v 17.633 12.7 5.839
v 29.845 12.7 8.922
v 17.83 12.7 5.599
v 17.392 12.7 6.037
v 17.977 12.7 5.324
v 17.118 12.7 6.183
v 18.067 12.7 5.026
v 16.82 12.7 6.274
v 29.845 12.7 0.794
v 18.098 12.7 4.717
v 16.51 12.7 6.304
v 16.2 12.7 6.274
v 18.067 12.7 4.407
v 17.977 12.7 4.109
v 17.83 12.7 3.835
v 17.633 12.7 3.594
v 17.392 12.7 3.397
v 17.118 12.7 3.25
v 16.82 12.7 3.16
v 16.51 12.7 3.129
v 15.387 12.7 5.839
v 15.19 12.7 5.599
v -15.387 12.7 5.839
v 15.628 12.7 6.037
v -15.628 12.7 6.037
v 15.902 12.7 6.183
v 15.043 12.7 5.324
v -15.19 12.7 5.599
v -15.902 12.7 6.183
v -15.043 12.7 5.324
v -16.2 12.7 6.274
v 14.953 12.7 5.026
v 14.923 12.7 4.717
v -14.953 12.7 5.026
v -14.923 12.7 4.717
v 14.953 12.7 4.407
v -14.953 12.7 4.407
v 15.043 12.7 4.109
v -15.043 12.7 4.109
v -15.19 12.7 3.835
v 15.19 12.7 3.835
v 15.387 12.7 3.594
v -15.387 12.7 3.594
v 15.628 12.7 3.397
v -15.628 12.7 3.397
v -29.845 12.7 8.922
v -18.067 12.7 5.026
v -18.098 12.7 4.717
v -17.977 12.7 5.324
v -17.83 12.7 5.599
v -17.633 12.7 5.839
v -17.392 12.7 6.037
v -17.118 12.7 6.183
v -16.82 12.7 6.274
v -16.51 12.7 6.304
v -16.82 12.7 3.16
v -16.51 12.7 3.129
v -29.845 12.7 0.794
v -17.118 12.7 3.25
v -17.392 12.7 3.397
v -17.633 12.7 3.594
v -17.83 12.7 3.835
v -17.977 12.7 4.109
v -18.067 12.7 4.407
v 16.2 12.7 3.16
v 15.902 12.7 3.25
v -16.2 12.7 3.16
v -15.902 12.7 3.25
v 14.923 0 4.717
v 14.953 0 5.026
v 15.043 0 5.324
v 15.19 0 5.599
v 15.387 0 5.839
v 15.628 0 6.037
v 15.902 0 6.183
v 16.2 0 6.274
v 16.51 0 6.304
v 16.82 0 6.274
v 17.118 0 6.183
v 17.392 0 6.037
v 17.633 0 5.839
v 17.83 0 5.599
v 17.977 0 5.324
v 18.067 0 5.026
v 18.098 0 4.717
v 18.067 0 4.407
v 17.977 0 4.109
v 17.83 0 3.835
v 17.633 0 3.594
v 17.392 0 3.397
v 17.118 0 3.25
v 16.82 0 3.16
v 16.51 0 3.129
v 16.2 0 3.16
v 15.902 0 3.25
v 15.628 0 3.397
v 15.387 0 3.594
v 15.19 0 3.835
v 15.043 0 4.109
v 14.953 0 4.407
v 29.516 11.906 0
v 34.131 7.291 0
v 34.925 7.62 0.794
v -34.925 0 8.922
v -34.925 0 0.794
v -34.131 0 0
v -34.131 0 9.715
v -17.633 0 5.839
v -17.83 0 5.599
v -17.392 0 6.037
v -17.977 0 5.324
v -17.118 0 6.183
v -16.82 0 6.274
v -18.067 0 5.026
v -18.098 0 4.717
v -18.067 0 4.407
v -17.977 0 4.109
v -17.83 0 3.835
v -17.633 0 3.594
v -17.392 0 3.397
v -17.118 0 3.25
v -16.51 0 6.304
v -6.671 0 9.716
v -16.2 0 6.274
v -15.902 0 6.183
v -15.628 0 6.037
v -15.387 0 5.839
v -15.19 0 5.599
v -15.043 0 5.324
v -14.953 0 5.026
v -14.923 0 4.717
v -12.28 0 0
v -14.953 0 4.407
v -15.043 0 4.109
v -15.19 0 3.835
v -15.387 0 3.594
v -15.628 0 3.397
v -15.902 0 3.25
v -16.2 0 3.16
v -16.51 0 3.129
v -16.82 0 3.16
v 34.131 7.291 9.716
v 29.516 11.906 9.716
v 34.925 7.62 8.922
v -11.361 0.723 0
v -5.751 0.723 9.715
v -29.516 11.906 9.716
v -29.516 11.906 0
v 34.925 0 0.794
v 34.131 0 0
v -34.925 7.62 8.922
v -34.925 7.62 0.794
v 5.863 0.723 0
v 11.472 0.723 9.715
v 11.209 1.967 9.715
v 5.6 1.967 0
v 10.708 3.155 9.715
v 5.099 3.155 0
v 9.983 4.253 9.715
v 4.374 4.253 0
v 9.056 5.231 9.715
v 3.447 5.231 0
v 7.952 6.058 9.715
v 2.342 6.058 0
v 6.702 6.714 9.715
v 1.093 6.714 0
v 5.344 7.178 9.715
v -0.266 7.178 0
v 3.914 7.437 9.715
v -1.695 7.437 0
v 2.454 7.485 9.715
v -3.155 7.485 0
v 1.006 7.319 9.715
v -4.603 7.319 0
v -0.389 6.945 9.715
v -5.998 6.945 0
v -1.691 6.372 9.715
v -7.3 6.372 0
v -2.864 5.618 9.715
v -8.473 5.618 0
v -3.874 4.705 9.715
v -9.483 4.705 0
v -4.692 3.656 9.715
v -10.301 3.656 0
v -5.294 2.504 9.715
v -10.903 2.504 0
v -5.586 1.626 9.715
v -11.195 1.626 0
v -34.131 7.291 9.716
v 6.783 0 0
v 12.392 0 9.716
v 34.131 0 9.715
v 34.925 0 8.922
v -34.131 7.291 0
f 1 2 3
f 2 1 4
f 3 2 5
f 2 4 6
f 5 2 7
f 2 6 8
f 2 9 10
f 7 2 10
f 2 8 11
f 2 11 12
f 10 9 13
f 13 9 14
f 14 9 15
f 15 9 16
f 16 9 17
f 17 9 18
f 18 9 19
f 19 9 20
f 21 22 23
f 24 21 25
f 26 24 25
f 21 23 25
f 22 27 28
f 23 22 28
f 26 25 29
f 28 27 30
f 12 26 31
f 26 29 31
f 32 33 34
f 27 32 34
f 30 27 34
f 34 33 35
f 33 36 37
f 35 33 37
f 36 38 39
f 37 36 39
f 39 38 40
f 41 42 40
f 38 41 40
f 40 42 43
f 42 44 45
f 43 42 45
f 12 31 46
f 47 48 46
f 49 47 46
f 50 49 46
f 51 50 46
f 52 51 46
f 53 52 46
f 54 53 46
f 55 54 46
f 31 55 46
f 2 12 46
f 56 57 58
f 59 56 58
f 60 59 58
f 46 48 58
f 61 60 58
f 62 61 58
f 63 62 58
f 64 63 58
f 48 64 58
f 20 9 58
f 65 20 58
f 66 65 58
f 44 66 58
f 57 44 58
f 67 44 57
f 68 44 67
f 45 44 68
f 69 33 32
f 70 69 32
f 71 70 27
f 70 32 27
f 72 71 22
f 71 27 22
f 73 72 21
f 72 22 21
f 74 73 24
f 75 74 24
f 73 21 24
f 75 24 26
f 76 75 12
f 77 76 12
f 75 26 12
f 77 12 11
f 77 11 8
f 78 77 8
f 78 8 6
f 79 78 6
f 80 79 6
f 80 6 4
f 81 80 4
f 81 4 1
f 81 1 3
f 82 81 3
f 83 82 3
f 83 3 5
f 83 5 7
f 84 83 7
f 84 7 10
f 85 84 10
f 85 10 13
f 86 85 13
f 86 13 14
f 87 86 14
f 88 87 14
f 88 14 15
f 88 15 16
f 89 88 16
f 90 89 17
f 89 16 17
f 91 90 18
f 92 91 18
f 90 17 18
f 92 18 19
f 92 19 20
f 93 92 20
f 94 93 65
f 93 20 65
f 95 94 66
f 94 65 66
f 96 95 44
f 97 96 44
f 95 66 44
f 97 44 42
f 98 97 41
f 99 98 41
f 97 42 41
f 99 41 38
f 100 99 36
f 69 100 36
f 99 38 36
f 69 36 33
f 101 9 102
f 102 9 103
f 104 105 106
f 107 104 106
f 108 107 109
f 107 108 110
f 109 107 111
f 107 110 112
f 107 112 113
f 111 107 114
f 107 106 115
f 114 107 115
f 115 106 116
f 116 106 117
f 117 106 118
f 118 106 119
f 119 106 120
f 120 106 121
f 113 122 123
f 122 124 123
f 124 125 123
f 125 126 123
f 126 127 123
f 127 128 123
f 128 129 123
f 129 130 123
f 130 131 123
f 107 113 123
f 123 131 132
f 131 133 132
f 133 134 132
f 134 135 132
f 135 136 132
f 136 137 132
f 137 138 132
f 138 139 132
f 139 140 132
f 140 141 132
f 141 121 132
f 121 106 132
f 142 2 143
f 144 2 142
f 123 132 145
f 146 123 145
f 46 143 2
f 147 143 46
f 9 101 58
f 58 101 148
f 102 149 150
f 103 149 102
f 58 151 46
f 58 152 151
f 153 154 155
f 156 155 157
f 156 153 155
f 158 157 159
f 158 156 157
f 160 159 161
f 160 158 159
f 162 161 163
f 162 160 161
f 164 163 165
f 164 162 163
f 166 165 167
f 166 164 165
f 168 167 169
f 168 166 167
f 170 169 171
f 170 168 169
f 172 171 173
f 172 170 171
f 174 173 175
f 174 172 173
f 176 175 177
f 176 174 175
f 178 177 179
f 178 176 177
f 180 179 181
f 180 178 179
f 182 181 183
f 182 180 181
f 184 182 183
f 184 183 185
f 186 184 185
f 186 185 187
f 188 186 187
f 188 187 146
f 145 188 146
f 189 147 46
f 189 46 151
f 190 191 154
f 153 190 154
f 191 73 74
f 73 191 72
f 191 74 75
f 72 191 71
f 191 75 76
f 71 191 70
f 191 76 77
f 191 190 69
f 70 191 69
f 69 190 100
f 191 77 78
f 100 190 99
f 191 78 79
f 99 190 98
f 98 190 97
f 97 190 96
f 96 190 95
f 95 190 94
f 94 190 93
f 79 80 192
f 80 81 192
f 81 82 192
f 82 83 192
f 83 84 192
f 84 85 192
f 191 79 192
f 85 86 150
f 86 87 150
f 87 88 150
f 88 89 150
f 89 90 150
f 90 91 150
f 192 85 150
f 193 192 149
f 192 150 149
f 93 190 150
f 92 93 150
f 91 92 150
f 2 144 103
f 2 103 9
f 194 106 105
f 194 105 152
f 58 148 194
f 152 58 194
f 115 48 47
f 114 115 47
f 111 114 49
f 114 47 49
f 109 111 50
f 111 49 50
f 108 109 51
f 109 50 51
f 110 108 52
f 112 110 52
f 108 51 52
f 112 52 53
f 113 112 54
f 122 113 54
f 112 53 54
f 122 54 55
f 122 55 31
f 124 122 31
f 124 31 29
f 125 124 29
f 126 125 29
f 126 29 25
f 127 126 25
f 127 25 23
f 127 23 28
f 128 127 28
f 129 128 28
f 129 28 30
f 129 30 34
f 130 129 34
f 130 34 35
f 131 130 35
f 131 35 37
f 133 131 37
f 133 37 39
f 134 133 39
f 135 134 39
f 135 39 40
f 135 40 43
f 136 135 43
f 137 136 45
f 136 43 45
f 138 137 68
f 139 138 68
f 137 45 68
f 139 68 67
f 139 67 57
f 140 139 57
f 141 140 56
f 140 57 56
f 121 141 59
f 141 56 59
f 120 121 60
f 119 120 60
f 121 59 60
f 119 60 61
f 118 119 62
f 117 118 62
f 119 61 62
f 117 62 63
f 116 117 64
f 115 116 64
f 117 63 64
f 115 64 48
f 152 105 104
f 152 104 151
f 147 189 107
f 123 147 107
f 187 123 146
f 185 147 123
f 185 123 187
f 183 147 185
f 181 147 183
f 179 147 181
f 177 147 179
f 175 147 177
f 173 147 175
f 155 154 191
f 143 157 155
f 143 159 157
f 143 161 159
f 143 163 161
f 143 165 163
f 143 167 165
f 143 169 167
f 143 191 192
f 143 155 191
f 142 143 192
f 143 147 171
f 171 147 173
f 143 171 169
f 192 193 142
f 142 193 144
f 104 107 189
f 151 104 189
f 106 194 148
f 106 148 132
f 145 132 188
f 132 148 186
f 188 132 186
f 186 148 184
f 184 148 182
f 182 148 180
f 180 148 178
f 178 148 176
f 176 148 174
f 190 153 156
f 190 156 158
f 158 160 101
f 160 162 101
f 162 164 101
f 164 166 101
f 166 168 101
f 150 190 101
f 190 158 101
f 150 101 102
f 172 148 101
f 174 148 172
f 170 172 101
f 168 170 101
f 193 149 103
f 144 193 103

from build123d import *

# Parameters (mm, degrees)
F0_W         = 34.925
F0_H         = 12.7
F1_DEPTH     = 9.7155
F3_R         = 1.5875
F4_DEPTH     = 25.4
F5_SIZE      = 0.79375
F6_T1_DEPTH  = 34.2562991577
F7_SIZE      = 0.79375
F11_R        = 7.493
F12_DEPTH    = 50.8
F13_T1_DEPTH = 15.1455192093
F13_T3_DEPTH = 15.1455192093


# Not quite as in the source:
# - a fillet or chamfer that OpenCascade refuses, or shapes differently, is made with other operations: its cross-section is extruded or revolved along the edge and cut away or added


with BuildPart() as f1:
    # F0 (on Top) → F1 (new body)
    with BuildSketch(Plane.XY):
        with Locations((-17.4625, 6.35)):
            Rectangle(F0_W, F0_H)
        with Locations((17.4625, 6.35)):
            Rectangle(F0_W, F0_H)
    extrude(amount=F1_DEPTH)

    # F3 (on face) → F4 (cut)
    with BuildSketch(Plane(origin=(0, 12.7, 0), x_dir=(-1, 0, 0), z_dir=(0, 1, 0))):
        with Locations((16.51, 4.71678)):
            Circle(F3_R)
        with Locations((-16.51, 4.71678)):
            Circle(F3_R)
    extrude(amount=-F4_DEPTH, mode=Mode.SUBTRACT)

    # F5
    f5_edges = [f1.edges().sort_by_distance(p)[0] for p in [
        (-34.925, 6.35, 9.7155),
        (34.925, 6.35, 9.7155),
        (0, 12.7, 9.7155),
        (0, 12.7, 0),
        (-34.925, 6.35, 0),
        (34.925, 6.35, 0),
    ]]
    chamfer(f5_edges, length=F5_SIZE)

    # F6: chamfer of 5.08 on 2 edges, made by hand

    # F6_s2 → F6_t1 (cut)
    with BuildSketch(Plane.XY.offset(-12.2703995789)):
        Polygon((34.925, 7.62), (29.845, 12.7), (34.925, 12.7), align=None)
        Polygon((-34.925, 7.62), (-29.845, 12.7), (-34.925, 12.7), align=None)
    extrude(amount=F6_T1_DEPTH, mode=Mode.SUBTRACT)

    # F7
    f7_edges = [f1.edges().sort_by_distance(p)[0] for p in [
        (32.385, 10.16, 0),
        (32.385, 10.16, 9.7155),
        (-32.385, 10.16, 9.7155),
        (-32.385, 10.16, 0),
    ]]
    chamfer(f7_edges, length=F7_SIZE)

    # F11 (on face) → F12 (cut)
    with BuildSketch(Plane(origin=(-8.3875461679, 0, -14.5276561136), x_dir=(0.8660254038, 0, -0.5), z_dir=(0.5, 0, 0.8660254038))):
        with Locations((-2.3805295629, 0)):
            Circle(F11_R)
    extrude(amount=F12_DEPTH, mode=Mode.SUBTRACT)

    # F13: chamfer of 0.8001 on 2 edges, made by hand

    # F13_s2 → F13_t1 (cut)
    with BuildSketch(Plane(origin=(3.740760597, 0, 6.4791874129), x_dir=(0, 1, 0), z_dir=(-0.5, 0, -0.8660254038))):
        with BuildLine():
            Line((0, -10.6349433883), (0.7229081164, -9.8385757451))
            ThreePointArc((0.7229081164, -9.8385757451), (0.3732081581, -9.8642294948), (0, -9.8735295629))
            Line((0, -9.8735295629), (0, -10.6349433883))
        make_face()
    extrude(amount=F13_T1_DEPTH, mode=Mode.SUBTRACT)

    # F13_s4 → F13_t3 (cut)
    with BuildSketch(Plane(origin=(0.4940865594, 0, 0.8557830242), x_dir=(0, 1, 0), z_dir=(0.5, 0, 0.8660254038))):
        with BuildLine():
            Line((0, -5.8738842624), (0.7229081164, -5.0775166192))
            ThreePointArc((0.7229081164, -5.0775166192), (0.3732081581, -5.103170369), (0, -5.1124704371))
            Line((0, -5.1124704371), (0, -5.8738842624))
        make_face()
    extrude(amount=F13_T3_DEPTH, mode=Mode.SUBTRACT)


solid = f1.part
